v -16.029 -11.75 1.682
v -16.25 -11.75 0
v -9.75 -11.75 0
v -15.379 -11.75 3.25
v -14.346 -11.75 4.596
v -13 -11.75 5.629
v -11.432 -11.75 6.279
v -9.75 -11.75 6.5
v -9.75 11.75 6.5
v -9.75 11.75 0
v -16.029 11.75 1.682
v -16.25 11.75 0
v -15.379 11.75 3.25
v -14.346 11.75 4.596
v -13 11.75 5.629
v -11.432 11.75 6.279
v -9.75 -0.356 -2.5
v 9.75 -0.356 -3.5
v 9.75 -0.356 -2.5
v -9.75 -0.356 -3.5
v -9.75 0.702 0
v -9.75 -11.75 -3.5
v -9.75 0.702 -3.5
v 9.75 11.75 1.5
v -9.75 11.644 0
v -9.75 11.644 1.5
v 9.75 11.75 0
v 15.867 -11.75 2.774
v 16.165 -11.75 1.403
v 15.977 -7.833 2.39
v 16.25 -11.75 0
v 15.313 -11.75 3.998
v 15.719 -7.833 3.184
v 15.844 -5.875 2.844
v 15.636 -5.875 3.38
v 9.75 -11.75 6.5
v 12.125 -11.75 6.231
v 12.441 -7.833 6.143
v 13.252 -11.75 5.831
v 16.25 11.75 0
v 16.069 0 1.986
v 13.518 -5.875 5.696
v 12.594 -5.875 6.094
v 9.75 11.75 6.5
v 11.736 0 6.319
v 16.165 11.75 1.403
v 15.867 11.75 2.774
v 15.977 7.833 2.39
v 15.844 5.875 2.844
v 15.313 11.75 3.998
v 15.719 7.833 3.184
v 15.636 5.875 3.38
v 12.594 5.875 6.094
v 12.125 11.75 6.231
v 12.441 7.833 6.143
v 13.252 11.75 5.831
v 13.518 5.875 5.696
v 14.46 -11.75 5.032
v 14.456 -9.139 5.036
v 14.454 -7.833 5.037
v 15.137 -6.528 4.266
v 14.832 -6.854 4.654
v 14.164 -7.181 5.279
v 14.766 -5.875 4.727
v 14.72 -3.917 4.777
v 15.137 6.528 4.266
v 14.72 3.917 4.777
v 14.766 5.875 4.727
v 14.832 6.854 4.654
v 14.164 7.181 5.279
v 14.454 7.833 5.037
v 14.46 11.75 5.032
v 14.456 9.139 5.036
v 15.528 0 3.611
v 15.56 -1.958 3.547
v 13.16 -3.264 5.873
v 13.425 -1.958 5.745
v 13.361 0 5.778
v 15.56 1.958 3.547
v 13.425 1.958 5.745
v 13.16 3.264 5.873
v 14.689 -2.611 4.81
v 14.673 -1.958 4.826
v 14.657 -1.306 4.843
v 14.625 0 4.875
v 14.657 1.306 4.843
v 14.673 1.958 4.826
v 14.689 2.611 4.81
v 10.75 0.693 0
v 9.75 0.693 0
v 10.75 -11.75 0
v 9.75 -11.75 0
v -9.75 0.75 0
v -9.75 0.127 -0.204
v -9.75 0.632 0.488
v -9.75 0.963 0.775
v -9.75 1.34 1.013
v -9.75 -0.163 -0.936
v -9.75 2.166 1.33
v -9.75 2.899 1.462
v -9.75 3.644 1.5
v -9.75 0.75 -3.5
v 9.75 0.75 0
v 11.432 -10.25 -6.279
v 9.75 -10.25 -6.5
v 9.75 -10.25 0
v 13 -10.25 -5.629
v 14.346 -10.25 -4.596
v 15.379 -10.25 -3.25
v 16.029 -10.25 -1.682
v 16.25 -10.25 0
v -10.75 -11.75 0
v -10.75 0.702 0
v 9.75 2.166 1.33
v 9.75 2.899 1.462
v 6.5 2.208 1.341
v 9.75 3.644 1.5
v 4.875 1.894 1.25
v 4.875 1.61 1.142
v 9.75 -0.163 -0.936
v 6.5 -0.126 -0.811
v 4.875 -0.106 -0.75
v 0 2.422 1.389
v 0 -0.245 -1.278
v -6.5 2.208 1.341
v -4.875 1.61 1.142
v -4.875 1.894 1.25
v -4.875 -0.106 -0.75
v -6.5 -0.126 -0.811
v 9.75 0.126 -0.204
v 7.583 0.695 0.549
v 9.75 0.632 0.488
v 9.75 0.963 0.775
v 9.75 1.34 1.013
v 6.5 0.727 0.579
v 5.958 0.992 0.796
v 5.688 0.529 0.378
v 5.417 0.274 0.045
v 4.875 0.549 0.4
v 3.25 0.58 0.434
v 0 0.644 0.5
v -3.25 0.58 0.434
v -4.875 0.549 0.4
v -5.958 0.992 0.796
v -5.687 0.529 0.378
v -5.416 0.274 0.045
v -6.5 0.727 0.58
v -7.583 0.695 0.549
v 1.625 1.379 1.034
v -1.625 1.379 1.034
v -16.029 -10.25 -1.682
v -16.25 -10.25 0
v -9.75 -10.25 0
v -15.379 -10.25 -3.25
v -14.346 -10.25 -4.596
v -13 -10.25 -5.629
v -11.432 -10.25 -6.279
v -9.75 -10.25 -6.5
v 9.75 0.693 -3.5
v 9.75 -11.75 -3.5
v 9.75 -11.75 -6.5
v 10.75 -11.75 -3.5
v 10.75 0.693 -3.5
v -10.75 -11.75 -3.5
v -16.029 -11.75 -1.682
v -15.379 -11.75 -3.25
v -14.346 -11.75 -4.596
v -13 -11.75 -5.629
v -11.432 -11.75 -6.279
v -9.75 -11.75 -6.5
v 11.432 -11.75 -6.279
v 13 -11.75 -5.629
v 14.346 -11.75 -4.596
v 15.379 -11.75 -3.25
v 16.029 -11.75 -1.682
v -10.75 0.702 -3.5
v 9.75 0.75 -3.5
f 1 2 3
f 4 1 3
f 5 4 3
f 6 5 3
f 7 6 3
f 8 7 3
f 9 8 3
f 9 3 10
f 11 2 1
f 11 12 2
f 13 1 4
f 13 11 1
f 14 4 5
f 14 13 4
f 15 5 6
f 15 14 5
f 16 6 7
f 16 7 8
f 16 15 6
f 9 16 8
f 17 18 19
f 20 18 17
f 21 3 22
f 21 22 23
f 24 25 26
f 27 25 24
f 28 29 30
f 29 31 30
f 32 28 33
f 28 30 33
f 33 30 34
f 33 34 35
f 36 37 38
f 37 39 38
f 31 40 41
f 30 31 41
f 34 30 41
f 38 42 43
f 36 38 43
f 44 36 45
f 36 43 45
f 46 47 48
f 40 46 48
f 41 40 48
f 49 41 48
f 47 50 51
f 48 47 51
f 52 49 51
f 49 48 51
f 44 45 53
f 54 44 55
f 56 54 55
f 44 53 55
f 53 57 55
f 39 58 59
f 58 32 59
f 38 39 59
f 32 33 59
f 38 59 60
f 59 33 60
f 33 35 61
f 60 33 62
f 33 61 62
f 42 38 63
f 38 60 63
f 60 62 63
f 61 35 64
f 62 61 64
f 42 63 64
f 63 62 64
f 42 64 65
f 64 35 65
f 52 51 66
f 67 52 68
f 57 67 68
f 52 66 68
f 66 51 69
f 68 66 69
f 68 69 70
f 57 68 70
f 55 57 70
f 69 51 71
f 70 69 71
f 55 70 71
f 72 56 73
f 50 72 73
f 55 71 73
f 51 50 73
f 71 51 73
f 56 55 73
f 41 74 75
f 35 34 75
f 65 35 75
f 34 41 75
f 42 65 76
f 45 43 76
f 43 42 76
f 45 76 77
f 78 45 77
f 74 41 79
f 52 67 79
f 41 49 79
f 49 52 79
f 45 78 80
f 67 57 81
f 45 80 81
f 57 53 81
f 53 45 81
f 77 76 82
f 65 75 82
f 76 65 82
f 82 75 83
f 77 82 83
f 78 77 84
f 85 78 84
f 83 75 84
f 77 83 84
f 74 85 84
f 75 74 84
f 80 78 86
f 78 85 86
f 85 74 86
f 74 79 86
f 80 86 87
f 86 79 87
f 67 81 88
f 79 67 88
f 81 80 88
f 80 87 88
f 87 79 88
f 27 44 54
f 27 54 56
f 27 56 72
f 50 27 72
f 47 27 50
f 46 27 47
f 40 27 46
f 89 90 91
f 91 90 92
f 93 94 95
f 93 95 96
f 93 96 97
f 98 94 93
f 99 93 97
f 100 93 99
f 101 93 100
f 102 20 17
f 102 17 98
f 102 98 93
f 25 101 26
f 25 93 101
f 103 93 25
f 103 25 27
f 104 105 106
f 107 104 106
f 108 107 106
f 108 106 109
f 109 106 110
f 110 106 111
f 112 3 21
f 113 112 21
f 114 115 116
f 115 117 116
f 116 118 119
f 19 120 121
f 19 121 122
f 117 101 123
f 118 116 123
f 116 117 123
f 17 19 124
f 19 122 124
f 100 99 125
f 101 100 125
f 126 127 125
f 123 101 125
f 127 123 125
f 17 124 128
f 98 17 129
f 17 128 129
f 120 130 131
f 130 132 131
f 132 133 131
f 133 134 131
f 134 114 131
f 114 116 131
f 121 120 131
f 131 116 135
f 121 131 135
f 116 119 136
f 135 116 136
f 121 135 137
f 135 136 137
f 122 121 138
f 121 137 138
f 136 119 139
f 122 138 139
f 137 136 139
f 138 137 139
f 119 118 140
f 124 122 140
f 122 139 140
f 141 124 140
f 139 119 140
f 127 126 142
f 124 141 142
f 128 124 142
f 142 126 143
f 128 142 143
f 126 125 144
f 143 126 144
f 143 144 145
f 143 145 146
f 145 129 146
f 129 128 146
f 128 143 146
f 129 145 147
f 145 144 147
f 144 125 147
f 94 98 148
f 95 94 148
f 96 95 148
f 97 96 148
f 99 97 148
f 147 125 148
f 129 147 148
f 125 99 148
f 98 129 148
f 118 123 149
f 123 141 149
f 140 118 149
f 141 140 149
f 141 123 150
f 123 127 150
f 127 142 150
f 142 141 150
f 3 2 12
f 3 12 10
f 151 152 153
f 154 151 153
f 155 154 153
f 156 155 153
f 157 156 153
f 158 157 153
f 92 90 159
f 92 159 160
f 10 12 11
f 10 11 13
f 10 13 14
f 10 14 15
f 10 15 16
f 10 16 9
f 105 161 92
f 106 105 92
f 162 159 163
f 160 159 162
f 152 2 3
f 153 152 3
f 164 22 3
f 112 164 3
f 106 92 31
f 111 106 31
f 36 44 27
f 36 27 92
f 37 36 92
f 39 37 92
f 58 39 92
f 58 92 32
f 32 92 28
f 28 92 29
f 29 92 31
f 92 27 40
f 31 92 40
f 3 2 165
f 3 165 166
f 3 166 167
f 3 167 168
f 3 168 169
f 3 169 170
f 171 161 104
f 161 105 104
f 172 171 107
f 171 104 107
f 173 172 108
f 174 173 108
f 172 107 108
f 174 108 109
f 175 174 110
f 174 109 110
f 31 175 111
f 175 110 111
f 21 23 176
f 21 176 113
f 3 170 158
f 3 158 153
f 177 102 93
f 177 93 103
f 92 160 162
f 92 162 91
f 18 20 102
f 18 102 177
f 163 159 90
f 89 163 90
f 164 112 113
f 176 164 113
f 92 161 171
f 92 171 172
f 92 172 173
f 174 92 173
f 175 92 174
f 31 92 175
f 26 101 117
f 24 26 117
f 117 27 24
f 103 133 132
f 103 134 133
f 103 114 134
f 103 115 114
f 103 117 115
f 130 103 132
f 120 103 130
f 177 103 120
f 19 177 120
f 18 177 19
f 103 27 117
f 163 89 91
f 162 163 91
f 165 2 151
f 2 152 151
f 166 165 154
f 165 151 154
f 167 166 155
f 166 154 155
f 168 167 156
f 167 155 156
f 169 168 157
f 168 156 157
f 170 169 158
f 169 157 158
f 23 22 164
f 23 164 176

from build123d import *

# Parameters (mm, degrees)
F0_W         = 32.5
F0_H         = 23.5
F1_DEPTH     = 6.5
F2_T1_DEPTH  = 56
F3_R         = 6.49999
F4_DEPTH     = 6.5
F6_DEPTH     = 3.5
F7_W         = 6.5
F7_H         = 6.5
F8_DEPTH     = 1.5
F9_R         = 6.49999
F10_W        = 6.5
F10_H        = 6.5
F11_DEPTH    = 1.5
F12_R        = 6.49999
F13_DEPTH    = 1.5
F14_T1_DEPTH = 39.4996332601
F15_W        = 19.4996332601
F15_H        = 11
F16_DEPTH    = 3.5
F17_W        = 12.4515531301
F17_H        = 3.5
F18_DEPTH    = 1
F19_W        = 12.4432003307
F19_H        = 3.5
F20_DEPTH    = 1


# Not quite as in the source:
# - a fillet or chamfer that OpenCascade refuses, or shapes differently, is made with other operations: its cross-section is extruded or revolved along the edge and cut away or added
# - a fillet or chamfer is up to 0.001 mm smaller than in the source, because OpenCascade refuses the exact size


with BuildPart() as f1:
    # F0 (on Top) → F1 (new body)
    with BuildSketch(Plane.XY):
        Rectangle(F0_W, F0_H)
    extrude(amount=F1_DEPTH)

    # F2: fillet of radius 6.5 on 1 edges, made by hand

    # F2_s2 → F2_t1 (cut)
    with BuildSketch(Plane.XZ.offset(-28)):
        with BuildLine():
            add(Edge.make_bspline(
                [(16.25, 0), (16.25, 6.5), (9.75, 6.5)],
                knots=[0, 0, 0, 1, 1, 1], degree=2, weights=[1, 1, 1]))
            Line((9.75, 6.5), (16.25, 6.5))
            Line((16.25, 6.5), (16.25, 0))
        make_face()
    extrude(amount=F2_T1_DEPTH, mode=Mode.SUBTRACT)

    # F3 (radius 6.5 in the source; OpenCascade refuses exactly that, so slightly less here)
    f3_edges = [f1.edges().sort_by_distance(p)[0] for p in [
        (-16.25, 0, 6.5),
    ]]
    fillet(f3_edges, radius=F3_R)

    # F4 (cut): a face of the model
    f4_faces = [f1.faces().sort_by_distance(p)[0] for p in [
        (-5e-06, 0, 6.5),
    ]]
    extrude(f4_faces, amount=-F4_DEPTH, mode=Mode.SUBTRACT)


with BuildPart() as f6:
    # F5 (on face) → F6 (new body)
    with BuildSketch(Plane(origin=(0, 0, 0), x_dir=(1, 0, 0), z_dir=(0, 0, -1))):
        Polygon((-9.7496332601, 0.3559169248), (-9.7496332601, -11.6440830752), (9.75, -11.75), (9.75, 0.3559169248), align=None)
    extrude(amount=F6_DEPTH)

    # F5 (on face) → F13 (join)
    with BuildSketch(Plane(origin=(0, 0, 0), x_dir=(1, 0, 0), z_dir=(0, 0, -1))):
        Polygon((-9.7496332601, 0.3559169248), (-9.7496332601, -11.6440830752), (9.75, -11.75), (9.75, 0.3559169248), align=None)
    extrude(amount=-F13_DEPTH)

    # F14: fillet of radius 4 on 1 edges, made by hand

    # F14_s2 → F14_t1 (cut)
    with BuildSketch(Plane.YZ.offset(-19.7496332601)):
        with BuildLine():
            add(Edge.make_bspline(
                [(3.6440830752, 1.5), (-0.3559169248, 1.5), (-0.3559169248, -2.5)],
                knots=[0, 0, 0, 1, 1, 1], degree=2, weights=[1, 1, 1]))
            Line((-0.3559169248, -2.5), (-0.3559169248, 1.5))
            Line((-0.3559169248, 1.5), (3.6440830752, 1.5))
        make_face()
    extrude(amount=F14_T1_DEPTH, mode=Mode.SUBTRACT)

    # F15 (on face) → F16 (cut)
    with BuildSketch(Plane(origin=(0, 0, -3.5), x_dir=(1, 0, 0), z_dir=(0, 0, -1))):
        with Locations((0.00018337, -6.25)):
            Rectangle(F15_W, F15_H)
    extrude(amount=-F16_DEPTH, mode=Mode.SUBTRACT)


with BuildPart() as f8:
    # F7 (on face) → F8 (new body)
    with BuildSketch(Plane.XZ.offset(11.75)):
        with Locations((-13, -3.25)):
            Rectangle(F7_W, F7_H)
    extrude(amount=-F8_DEPTH)

    # F9 (radius 6.5 in the source; OpenCascade refuses exactly that, so slightly less here)
    f9_edges = [f8.edges().sort_by_distance(p)[0] for p in [
        (-16.25, -11, -6.5),
    ]]
    fillet(f9_edges, radius=F9_R)


with BuildPart() as f11:
    # F10 (on face) → F11 (new body)
    with BuildSketch(Plane.XZ.offset(11.75)):
        with Locations((13, -3.25)):
            Rectangle(F10_W, F10_H)
    extrude(amount=-F11_DEPTH)

    # F12 (radius 6.5 in the source; OpenCascade refuses exactly that, so slightly less here)
    f12_edges = [f11.edges().sort_by_distance(p)[0] for p in [
        (16.25, -11, -6.5),
    ]]
    fillet(f12_edges, radius=F12_R)


with BuildPart() as f18:
    # F17 (on face) → F18 (new body)
    with BuildSketch(Plane.YZ.offset(-9.75)):
        with Locations((-5.524223435, -1.75)):
            Rectangle(F17_W, F17_H)
    extrude(amount=-F18_DEPTH)


with BuildPart() as f20:
    # F19 (on face) → F20 (new body)
    with BuildSketch(Plane(origin=(9.75, 0, 0), x_dir=(0, -1, 0), z_dir=(-1, 0, 0))):
        with Locations((5.5283998346, -1.75)):
            Rectangle(F19_W, F19_H)
    extrude(amount=-F20_DEPTH)


solid = Compound([f1.part, f6.part, f8.part, f11.part, f18.part, f20.part])
